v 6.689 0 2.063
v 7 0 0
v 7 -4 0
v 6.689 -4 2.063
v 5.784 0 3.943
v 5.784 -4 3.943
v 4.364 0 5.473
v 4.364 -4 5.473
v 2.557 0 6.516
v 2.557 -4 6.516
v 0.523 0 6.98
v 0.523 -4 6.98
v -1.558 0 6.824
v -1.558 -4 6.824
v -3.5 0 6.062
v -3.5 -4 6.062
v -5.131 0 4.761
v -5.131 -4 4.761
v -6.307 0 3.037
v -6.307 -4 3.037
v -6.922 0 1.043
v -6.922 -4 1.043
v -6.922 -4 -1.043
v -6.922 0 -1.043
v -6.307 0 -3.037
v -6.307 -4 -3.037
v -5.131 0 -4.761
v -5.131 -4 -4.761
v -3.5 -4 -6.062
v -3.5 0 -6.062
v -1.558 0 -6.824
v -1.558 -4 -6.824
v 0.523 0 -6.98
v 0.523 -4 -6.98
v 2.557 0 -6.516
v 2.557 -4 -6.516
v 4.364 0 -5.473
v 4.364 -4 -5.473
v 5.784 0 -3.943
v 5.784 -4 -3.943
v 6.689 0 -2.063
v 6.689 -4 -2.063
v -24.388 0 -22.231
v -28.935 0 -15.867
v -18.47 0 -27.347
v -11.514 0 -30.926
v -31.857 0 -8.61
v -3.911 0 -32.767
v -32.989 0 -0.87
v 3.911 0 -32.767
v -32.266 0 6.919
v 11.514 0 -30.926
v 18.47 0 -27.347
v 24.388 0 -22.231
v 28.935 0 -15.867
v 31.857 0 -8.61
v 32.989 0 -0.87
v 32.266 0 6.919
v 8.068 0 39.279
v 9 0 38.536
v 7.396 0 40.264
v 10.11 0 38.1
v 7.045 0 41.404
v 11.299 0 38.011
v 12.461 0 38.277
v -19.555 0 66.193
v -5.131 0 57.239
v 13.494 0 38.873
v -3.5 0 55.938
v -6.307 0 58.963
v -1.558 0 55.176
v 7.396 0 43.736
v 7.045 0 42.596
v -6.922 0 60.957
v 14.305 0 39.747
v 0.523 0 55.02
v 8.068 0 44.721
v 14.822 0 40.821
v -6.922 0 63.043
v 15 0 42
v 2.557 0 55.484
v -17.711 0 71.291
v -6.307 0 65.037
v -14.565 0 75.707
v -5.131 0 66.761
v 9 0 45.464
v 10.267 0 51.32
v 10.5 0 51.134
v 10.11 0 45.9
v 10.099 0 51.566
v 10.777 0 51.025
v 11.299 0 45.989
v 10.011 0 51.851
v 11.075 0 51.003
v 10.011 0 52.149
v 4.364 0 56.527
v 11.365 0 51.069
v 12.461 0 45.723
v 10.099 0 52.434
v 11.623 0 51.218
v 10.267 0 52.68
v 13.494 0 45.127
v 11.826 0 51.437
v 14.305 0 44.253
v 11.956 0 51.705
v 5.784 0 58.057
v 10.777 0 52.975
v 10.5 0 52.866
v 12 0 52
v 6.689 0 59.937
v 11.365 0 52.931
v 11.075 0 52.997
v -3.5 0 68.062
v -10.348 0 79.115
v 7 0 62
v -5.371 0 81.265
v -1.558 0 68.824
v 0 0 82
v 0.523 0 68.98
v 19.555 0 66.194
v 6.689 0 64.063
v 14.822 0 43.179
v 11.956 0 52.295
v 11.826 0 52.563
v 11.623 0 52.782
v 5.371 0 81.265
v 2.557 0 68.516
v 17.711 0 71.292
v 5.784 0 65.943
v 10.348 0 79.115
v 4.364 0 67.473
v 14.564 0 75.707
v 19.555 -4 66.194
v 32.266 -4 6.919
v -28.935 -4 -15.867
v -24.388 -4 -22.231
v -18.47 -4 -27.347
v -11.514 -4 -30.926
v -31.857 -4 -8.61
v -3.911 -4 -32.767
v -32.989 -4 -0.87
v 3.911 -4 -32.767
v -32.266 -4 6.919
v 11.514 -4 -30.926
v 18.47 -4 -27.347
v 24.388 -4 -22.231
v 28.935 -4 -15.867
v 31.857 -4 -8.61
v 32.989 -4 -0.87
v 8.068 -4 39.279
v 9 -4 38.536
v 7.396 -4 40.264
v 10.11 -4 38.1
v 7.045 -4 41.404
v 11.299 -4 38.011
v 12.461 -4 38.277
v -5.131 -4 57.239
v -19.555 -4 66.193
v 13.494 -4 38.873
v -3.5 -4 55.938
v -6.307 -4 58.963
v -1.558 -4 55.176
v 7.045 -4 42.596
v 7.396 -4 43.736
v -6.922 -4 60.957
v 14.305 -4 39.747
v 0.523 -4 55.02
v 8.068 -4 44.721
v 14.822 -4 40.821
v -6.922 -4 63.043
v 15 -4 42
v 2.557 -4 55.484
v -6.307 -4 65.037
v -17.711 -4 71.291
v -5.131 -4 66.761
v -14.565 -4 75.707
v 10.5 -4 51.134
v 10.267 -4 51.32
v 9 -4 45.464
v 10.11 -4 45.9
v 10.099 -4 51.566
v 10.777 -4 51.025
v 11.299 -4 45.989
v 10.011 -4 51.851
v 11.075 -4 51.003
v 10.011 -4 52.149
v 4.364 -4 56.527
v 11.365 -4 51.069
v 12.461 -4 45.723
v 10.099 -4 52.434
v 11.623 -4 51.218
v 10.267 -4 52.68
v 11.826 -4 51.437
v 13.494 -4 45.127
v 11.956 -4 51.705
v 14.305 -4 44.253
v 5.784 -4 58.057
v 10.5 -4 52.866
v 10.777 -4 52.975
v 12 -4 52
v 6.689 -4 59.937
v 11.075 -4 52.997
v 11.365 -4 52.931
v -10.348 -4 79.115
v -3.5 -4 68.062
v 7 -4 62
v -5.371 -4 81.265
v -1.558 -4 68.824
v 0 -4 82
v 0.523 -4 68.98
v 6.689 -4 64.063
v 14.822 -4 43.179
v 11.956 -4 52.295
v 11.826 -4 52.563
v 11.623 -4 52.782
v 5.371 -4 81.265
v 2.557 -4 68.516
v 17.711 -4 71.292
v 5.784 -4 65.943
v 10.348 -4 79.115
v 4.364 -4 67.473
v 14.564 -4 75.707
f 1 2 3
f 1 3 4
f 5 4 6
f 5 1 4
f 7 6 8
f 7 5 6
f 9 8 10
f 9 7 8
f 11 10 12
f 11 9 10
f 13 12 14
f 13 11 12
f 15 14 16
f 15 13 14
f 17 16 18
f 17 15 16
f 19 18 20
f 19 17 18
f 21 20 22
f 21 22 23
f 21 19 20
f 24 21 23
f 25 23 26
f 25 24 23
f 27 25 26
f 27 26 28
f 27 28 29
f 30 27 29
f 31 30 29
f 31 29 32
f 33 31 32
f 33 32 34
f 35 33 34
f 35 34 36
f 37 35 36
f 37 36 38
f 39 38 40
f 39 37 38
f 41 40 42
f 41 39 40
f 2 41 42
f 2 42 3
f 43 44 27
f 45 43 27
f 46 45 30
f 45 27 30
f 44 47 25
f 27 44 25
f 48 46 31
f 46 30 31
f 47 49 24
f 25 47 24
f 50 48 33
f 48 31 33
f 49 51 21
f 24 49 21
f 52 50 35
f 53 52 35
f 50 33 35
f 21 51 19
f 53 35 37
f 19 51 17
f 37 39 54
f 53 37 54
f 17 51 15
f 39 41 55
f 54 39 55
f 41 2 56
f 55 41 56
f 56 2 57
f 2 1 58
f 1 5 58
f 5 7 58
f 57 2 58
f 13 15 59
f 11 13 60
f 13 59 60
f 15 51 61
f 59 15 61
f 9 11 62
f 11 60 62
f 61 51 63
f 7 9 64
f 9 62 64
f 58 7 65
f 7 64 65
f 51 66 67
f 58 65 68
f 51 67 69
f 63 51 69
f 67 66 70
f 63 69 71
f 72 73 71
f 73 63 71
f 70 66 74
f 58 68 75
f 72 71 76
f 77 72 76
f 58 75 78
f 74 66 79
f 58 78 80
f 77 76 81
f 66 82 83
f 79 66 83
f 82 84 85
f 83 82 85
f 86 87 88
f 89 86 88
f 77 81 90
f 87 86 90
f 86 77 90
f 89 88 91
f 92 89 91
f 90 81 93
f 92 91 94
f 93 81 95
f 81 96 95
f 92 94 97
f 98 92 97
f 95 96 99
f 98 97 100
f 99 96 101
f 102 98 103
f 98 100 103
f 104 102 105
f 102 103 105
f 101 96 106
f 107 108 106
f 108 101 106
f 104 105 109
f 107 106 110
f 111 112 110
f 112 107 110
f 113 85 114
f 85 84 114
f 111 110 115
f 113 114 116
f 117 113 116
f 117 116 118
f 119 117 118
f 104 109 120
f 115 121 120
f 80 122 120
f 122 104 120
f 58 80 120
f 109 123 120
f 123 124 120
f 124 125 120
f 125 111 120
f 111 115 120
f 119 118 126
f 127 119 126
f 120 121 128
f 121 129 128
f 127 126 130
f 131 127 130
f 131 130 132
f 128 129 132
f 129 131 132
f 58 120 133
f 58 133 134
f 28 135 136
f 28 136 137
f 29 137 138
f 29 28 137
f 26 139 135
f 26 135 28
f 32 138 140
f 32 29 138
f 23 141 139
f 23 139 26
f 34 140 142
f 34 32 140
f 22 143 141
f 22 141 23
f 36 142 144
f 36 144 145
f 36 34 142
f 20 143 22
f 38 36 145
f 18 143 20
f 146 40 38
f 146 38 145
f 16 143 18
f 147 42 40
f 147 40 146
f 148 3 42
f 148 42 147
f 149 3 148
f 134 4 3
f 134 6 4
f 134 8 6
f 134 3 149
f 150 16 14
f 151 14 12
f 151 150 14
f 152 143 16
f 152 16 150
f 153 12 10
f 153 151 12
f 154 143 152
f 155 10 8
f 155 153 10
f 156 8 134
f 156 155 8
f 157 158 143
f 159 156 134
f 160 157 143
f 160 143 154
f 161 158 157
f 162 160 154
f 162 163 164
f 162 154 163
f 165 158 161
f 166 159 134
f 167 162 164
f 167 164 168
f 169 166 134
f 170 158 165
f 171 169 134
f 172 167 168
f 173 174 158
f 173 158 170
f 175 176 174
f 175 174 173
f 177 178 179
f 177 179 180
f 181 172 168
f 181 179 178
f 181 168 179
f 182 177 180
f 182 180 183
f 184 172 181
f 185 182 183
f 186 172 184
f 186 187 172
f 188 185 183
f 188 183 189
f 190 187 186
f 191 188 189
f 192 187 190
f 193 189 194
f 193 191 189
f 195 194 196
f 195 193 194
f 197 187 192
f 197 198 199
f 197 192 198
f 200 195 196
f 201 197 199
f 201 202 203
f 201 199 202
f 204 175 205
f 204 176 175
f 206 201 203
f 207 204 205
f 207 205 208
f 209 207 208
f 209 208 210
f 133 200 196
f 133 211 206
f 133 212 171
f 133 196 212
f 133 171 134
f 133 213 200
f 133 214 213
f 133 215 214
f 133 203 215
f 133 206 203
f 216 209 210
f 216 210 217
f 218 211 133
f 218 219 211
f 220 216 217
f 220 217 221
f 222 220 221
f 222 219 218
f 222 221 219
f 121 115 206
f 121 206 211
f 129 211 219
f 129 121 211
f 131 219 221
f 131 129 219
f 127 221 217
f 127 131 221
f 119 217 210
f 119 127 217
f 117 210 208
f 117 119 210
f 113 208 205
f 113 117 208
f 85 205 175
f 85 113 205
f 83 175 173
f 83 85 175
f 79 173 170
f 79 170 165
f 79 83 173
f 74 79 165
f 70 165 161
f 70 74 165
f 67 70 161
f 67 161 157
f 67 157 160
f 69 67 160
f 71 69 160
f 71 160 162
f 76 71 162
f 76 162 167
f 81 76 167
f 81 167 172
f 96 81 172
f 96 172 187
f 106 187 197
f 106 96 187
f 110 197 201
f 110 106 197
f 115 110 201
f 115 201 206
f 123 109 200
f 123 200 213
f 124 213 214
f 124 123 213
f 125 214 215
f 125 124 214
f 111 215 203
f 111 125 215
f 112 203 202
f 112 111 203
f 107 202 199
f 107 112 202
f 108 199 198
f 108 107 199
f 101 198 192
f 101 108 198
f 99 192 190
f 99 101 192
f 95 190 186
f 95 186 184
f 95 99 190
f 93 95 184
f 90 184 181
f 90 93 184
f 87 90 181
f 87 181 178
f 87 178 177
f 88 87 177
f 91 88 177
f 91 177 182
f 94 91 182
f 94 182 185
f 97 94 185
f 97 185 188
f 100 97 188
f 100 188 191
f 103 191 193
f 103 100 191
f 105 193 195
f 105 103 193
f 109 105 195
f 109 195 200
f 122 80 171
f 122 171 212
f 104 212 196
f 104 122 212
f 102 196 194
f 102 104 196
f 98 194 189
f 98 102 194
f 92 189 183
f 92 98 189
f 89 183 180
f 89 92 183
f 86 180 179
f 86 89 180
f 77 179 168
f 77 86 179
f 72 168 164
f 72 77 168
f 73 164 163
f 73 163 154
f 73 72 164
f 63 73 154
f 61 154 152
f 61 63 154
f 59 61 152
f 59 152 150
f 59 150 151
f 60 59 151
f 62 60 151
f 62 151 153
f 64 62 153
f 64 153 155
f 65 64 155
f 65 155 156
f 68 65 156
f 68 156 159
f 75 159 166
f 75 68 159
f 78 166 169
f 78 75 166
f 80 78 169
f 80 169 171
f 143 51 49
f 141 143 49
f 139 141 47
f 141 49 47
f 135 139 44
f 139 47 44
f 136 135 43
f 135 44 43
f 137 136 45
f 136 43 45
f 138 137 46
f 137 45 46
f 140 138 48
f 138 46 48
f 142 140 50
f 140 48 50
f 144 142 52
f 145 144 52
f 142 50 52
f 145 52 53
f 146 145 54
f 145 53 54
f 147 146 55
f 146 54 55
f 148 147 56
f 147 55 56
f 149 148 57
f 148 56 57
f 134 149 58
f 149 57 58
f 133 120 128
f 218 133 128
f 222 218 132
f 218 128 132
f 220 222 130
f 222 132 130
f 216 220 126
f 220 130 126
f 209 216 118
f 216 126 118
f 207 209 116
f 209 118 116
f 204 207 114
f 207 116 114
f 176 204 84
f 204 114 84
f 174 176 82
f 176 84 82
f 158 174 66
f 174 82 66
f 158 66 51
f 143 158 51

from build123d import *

# Parameters (mm, degrees)
SKETCH_R   = 7
SKETCH_R_2 = 4
SKETCH_R_3 = 1
PAD_DEPTH  = 4


with BuildPart() as part:
    # Sketch → Pad (new body)
    with BuildSketch(Plane.XZ):
        with BuildLine():
            Line((-19.555423, 66.193498), (-32.26643, 6.919355))
            ThreePointArc((-32.26643, 6.919355), (0, -33), (32.26643, 6.919355))
            Line((19.555402, 66.193599), (32.26643, 6.919355))
            ThreePointArc((19.555402, 66.193599), (-5.1e-05, 82), (-19.555423, 66.193498))
        make_face()
        with Locations((0, 62)):
            Circle(SKETCH_R, mode=Mode.SUBTRACT)
        Circle(SKETCH_R, mode=Mode.SUBTRACT)
        with Locations((11, 42)):
            Circle(SKETCH_R_2, mode=Mode.SUBTRACT)
        with Locations((11, 52)):
            Circle(SKETCH_R_3, mode=Mode.SUBTRACT)
    extrude(amount=PAD_DEPTH)


solid = part.part
